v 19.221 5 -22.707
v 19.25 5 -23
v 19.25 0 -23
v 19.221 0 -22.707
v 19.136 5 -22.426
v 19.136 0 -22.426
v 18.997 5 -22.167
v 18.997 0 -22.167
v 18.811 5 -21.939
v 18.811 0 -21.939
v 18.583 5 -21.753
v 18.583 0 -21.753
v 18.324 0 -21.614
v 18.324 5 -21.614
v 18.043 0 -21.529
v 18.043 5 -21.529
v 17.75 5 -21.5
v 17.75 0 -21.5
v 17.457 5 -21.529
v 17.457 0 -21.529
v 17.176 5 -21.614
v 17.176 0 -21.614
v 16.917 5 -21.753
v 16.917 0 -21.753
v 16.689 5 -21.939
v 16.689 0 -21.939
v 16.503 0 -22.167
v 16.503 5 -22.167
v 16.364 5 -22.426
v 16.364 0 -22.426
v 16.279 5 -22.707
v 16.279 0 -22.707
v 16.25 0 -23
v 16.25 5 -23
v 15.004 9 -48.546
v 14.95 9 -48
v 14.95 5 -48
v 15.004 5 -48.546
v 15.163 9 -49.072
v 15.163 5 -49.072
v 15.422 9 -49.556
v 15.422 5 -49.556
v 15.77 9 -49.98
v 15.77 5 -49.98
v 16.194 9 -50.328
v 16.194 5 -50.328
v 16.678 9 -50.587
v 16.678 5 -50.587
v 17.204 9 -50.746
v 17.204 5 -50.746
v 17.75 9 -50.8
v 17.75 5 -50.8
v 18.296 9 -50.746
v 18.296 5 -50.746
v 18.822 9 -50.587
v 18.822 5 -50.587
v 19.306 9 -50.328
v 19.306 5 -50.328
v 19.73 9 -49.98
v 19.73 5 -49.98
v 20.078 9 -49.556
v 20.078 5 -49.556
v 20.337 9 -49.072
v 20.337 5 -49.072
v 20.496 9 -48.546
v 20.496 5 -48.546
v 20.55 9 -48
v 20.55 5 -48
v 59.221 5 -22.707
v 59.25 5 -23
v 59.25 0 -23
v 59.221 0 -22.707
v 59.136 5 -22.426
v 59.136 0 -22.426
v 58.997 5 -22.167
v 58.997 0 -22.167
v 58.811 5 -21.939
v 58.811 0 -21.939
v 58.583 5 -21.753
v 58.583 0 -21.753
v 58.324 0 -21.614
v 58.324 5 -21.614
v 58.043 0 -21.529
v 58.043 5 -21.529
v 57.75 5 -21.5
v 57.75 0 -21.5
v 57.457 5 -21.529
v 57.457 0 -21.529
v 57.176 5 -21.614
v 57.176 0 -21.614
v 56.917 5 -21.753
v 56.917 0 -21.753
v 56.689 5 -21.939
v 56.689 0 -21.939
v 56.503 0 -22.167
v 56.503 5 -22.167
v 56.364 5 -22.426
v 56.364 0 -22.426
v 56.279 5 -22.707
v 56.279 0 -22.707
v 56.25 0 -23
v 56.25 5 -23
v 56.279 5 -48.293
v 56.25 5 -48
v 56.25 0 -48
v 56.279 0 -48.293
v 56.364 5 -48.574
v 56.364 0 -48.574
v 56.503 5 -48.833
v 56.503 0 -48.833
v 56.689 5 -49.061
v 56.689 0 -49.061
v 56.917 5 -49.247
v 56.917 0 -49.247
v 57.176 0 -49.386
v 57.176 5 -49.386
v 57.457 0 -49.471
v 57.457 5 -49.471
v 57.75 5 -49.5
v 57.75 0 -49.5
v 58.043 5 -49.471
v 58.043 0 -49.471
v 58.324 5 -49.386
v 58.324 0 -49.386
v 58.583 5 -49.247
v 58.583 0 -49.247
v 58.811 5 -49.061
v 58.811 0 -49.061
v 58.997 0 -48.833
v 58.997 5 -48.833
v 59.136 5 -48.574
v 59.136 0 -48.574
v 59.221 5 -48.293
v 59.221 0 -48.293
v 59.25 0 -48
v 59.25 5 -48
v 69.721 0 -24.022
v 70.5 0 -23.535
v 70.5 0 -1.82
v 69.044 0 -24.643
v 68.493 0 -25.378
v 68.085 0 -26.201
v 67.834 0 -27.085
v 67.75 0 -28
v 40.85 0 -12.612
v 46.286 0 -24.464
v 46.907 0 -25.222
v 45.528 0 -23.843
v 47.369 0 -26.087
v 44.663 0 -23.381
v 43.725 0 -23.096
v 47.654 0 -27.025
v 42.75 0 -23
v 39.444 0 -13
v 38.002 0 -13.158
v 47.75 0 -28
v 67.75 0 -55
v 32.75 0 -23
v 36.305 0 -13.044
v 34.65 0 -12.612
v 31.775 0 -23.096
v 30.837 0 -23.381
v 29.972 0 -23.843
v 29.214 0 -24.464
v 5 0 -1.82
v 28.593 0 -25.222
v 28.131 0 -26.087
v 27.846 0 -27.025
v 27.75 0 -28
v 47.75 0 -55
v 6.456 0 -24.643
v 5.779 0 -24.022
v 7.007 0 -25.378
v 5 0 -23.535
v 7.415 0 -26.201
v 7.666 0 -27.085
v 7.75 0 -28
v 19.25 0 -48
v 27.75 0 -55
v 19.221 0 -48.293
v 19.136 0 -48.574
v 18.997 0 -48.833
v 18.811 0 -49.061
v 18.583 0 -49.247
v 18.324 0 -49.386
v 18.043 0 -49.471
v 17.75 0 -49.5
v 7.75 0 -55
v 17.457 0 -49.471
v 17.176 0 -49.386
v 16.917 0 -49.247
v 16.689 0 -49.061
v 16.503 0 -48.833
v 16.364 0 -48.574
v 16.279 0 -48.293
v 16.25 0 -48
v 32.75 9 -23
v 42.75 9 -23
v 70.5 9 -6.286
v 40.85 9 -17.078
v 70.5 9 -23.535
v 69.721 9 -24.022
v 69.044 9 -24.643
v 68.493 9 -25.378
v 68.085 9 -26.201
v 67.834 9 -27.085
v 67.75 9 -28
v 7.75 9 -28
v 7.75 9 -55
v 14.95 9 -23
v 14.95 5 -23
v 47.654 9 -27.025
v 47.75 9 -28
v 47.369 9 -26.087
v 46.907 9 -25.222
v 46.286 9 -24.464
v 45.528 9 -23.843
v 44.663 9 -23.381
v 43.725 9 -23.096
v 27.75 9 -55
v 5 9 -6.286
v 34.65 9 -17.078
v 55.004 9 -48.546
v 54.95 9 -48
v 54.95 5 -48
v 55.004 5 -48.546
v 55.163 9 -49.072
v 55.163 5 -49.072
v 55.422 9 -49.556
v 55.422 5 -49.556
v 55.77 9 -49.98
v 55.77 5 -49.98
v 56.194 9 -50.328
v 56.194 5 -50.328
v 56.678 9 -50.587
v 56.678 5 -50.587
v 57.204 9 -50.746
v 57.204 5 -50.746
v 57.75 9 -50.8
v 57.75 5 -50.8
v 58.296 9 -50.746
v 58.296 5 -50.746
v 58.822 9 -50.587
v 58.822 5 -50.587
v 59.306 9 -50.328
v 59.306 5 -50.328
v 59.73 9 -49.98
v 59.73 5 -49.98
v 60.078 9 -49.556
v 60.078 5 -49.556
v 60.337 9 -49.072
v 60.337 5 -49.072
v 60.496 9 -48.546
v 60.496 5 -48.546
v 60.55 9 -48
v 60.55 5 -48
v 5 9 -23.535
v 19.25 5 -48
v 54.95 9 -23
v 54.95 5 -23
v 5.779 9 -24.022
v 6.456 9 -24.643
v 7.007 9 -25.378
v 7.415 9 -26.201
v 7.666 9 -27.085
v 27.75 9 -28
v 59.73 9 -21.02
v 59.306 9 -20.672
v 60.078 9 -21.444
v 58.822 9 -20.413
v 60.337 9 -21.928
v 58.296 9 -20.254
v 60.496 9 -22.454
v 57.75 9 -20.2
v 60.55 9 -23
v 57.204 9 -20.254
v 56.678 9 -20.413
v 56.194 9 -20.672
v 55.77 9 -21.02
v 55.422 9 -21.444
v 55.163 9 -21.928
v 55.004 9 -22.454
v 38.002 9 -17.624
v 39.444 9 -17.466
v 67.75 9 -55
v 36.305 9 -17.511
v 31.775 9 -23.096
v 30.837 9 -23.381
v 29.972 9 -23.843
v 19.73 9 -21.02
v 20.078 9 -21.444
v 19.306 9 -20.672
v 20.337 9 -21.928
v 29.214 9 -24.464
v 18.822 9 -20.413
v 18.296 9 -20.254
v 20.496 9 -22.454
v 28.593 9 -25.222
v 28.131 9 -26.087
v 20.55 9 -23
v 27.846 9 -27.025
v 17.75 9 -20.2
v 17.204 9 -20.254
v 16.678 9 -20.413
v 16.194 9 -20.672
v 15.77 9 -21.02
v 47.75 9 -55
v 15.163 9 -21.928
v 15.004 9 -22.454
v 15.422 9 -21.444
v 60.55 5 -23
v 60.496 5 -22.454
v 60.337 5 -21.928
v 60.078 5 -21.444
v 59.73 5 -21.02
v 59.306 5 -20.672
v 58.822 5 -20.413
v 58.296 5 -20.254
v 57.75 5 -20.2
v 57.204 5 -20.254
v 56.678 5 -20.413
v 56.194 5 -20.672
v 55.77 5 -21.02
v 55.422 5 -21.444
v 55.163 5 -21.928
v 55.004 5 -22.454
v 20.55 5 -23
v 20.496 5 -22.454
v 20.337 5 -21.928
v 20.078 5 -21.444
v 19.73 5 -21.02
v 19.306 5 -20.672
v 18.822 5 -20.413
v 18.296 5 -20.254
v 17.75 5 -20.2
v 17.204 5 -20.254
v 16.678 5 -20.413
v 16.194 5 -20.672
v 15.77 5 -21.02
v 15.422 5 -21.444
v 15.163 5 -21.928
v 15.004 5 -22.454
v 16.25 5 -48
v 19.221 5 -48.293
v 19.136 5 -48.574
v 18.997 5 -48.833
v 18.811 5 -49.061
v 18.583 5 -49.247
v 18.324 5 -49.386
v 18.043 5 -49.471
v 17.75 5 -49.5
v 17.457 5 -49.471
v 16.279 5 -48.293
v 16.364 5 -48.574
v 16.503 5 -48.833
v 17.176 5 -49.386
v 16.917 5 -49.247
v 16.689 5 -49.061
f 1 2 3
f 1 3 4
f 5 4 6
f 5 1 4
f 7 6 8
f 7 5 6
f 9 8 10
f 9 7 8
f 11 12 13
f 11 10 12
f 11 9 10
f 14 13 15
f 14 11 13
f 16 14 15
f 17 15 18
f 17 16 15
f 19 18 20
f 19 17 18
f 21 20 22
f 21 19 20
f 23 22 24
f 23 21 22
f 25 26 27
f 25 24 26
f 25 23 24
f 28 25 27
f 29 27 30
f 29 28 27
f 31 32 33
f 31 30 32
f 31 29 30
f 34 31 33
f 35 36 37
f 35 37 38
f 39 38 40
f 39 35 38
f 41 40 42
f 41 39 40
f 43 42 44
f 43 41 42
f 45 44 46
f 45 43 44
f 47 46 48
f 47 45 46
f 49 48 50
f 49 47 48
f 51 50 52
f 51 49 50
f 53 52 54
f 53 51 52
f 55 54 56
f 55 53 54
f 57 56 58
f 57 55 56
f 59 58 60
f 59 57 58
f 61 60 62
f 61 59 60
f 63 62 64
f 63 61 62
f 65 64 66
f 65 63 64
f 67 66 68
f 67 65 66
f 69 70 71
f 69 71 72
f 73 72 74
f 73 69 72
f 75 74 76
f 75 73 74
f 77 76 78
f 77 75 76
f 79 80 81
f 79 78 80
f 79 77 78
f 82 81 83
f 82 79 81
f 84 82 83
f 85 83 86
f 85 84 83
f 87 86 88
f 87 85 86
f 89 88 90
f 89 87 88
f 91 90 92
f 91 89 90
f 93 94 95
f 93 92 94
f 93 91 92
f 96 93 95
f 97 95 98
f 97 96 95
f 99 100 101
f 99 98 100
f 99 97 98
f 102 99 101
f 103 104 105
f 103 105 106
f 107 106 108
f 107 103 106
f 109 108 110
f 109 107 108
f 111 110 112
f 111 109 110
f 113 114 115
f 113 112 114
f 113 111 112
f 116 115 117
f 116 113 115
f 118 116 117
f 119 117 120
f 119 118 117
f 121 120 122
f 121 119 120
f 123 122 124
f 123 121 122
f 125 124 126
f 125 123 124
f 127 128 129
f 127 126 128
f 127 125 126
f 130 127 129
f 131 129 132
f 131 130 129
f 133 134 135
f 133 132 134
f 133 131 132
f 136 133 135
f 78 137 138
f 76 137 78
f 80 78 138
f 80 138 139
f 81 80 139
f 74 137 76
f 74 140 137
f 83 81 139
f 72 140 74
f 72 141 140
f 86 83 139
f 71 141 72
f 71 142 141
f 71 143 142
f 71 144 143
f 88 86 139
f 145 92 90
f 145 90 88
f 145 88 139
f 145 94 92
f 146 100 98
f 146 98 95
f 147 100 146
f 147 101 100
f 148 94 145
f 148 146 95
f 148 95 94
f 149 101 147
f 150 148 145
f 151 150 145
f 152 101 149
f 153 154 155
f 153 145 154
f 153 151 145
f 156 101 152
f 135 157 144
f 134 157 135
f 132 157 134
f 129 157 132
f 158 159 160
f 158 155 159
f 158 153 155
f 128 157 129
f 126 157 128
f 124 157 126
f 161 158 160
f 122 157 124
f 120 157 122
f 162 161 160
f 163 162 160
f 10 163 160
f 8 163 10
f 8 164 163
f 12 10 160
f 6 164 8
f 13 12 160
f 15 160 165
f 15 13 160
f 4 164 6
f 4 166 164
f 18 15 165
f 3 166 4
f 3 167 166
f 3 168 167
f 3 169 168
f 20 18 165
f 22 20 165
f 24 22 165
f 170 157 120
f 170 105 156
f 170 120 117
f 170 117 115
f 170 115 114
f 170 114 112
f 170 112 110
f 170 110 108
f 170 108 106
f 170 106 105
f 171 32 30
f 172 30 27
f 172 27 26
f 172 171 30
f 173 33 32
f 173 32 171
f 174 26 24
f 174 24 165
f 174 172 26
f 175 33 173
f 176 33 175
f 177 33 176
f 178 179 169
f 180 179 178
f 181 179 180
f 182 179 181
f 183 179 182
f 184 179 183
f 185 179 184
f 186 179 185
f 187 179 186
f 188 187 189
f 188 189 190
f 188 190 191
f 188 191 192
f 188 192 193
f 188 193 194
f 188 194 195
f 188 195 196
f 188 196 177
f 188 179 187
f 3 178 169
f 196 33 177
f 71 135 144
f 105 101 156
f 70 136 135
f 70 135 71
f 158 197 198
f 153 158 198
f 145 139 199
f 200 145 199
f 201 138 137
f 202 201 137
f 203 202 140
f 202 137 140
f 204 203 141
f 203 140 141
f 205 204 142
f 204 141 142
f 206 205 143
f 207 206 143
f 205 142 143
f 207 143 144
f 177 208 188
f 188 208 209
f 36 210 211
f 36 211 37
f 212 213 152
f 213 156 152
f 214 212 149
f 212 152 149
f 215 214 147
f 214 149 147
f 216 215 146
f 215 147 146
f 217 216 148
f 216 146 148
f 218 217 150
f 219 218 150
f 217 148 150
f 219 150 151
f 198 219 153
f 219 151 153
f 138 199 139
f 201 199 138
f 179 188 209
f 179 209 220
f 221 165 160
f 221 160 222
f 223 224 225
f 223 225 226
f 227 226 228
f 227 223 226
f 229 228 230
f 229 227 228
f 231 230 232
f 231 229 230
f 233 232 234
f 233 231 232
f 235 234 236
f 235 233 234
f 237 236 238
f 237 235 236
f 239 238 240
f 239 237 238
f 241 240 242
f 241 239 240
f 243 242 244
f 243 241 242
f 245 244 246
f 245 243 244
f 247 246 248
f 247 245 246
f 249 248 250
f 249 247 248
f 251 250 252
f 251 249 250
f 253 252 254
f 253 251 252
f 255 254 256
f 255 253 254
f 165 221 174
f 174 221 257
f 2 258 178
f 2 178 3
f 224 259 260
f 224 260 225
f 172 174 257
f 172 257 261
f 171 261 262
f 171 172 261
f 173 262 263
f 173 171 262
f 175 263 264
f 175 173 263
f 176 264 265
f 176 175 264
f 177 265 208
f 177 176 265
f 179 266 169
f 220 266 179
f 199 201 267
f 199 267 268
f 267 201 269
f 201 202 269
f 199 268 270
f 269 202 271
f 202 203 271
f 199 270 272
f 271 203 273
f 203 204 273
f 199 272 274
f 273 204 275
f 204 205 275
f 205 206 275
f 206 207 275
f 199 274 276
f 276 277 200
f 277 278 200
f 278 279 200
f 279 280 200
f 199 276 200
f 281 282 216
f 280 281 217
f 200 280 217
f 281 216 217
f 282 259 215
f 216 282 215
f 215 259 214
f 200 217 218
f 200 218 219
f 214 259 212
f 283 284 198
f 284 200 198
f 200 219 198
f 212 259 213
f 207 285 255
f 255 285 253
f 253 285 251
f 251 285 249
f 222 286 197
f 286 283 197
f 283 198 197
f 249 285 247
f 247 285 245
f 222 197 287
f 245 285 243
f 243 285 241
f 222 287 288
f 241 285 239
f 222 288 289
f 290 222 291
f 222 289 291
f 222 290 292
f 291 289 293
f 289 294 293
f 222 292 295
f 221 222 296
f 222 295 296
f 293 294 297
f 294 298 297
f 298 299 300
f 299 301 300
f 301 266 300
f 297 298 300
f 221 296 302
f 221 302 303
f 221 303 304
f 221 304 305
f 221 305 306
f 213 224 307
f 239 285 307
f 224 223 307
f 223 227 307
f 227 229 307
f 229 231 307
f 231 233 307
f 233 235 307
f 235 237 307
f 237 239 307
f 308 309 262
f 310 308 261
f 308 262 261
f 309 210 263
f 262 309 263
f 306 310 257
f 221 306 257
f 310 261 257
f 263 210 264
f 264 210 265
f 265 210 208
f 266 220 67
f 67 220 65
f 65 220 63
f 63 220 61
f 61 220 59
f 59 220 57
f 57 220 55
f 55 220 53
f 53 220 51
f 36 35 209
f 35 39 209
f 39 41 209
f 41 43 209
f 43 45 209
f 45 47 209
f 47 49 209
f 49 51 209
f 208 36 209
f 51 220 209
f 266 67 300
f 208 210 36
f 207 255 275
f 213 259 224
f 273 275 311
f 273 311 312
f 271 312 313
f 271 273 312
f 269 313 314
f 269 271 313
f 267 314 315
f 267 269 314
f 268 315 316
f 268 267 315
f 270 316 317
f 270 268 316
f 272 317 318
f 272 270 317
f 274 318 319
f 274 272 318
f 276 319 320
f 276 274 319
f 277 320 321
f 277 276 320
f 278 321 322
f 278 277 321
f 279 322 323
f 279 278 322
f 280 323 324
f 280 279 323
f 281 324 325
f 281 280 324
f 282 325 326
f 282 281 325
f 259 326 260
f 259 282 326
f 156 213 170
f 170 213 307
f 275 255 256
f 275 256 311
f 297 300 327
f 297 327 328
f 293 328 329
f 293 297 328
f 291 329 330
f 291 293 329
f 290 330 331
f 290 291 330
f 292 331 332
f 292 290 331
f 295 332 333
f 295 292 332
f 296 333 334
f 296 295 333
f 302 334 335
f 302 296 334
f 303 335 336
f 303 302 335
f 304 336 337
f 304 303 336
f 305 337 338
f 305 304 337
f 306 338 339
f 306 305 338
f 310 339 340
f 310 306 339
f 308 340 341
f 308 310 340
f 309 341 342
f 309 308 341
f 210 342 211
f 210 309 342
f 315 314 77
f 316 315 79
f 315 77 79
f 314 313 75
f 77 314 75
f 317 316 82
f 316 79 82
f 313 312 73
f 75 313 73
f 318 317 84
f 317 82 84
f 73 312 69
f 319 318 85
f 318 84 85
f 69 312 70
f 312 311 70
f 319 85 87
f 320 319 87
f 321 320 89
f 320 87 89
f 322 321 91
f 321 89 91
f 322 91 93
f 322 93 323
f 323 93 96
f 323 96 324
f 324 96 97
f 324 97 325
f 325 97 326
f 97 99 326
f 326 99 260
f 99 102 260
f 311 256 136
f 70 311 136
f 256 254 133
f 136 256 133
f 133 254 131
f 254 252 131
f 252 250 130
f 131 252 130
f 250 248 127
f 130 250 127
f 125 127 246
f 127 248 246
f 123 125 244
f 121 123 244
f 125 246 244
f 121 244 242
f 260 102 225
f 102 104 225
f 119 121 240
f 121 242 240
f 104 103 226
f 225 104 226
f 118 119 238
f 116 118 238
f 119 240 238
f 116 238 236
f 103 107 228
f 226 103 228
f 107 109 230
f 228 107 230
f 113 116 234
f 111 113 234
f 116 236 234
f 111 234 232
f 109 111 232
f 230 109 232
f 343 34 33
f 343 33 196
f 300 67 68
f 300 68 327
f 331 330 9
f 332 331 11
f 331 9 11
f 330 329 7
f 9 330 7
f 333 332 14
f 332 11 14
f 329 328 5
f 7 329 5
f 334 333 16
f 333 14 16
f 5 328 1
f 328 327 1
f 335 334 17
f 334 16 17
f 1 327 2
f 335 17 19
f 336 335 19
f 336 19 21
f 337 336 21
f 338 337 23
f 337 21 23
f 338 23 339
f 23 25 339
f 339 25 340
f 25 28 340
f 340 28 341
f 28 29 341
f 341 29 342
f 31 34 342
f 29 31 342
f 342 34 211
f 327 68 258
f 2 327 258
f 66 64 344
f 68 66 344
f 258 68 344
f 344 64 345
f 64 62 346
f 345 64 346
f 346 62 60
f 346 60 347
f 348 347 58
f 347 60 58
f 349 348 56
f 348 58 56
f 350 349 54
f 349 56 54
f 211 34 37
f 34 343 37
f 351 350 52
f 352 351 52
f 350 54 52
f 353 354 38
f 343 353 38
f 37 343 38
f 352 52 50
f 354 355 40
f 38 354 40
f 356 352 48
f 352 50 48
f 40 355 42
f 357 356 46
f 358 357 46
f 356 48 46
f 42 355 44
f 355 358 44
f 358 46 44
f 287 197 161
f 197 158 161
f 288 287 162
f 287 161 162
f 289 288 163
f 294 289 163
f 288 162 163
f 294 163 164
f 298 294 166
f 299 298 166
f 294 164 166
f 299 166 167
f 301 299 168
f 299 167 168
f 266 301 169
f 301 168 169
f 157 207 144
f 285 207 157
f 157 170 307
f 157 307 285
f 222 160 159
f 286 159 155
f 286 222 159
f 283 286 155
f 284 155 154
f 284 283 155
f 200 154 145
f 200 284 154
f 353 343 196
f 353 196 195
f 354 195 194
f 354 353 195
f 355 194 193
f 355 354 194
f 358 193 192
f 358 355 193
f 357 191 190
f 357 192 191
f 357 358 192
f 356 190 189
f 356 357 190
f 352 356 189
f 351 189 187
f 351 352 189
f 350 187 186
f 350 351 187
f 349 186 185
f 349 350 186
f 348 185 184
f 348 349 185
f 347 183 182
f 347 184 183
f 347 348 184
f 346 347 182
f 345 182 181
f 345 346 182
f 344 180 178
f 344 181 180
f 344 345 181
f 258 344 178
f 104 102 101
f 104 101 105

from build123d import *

# Parameters (mm, degrees)
BOSS_EXTRUDE1_DEPTH = 9
CUT_EXTRUDE2_REACH  = 95.842
SKETCH5_W           = 20
SKETCH5_H           = 32
SKETCH5_W_2         = 7.75
CUT_EXTRUDE3_DEPTH  = 10
FILLET1_R           = 5
CUT_EXTRUDE4_DEPTH  = 4
CHAMFER1_SIZE       = 9
CHAMFER1_SIZE_2     = 4.196768923
FILLET2_R           = 10
CUT_EXTRUDE5_REACH  = 95.842
SKETCH7_W           = 5
SKETCH7_H           = 33.085129134
SKETCH7_H_2         = 33.745309592


with BuildPart() as part:
    # Sketch1 → Boss-Extrude1 (new body)
    with BuildSketch(Plane(origin=(0, 0, 0), x_dir=(1, 0, 0), z_dir=(0, 1, 0))):
        Polygon((0, 0), (0, 55), (75.5, 55), (75.5, 0), (37.75, 13.739876344), align=None)
    extrude(amount=BOSS_EXTRUDE1_DEPTH)

    # Sketch4 → Cut-Extrude2 (cut, up to next)
    with BuildSketch(Plane(origin=(0, 9, 0), x_dir=(1, 0, 0), z_dir=(0, 1, 0)), mode=Mode.PRIVATE) as cut_extrude2_sk1:
        with BuildLine():
            Line((19.25, 48), (19.25, 23))
            ThreePointArc((19.25, 23), (17.75, 21.5), (16.25, 23))
            Line((16.25, 23), (16.25, 48))
            ThreePointArc((16.25, 48), (17.75, 49.5), (19.25, 48))
        make_face()
    cut_extrude2_tool1 = extrude(cut_extrude2_sk1.sketch, amount=-CUT_EXTRUDE2_REACH, mode=Mode.PRIVATE) & part.part
    # Sketch4 → Cut-Extrude2 (cut, up to next)
    with BuildSketch(Plane(origin=(0, 9, 0), x_dir=(1, 0, 0), z_dir=(0, 1, 0)), mode=Mode.PRIVATE) as cut_extrude2_sk2:
        with BuildLine():
            Line((59.25, 48), (59.25, 23))
            ThreePointArc((59.25, 23), (57.75, 21.5), (56.25, 23))
            Line((56.25, 23), (56.25, 48))
            ThreePointArc((56.25, 48), (57.75, 49.5), (59.25, 48))
        make_face()
    cut_extrude2_tool2 = extrude(cut_extrude2_sk2.sketch, amount=-CUT_EXTRUDE2_REACH, mode=Mode.PRIVATE) & part.part
    add(cut_extrude2_tool1.solids().sort_by_distance((17.75, 9, -35.5))[0], mode=Mode.SUBTRACT)
    add(cut_extrude2_tool2.solids().sort_by_distance((57.75, 9, -35.5))[0], mode=Mode.SUBTRACT)

    # Sketch5 → Cut-Extrude3 (cut)
    with BuildSketch(Plane(origin=(0, 9, 0), x_dir=(1, 0, 0), z_dir=(0, 1, 0))):
        with Locations((37.75, 39)):
            Rectangle(SKETCH5_W, SKETCH5_H)
        with Locations((71.625, 39)):
            Rectangle(SKETCH5_W_2, SKETCH5_H)
        with Locations((3.875, 39)):
            Rectangle(SKETCH5_W_2, SKETCH5_H)
    extrude(amount=-CUT_EXTRUDE3_DEPTH, mode=Mode.SUBTRACT)

    # Fillet1
    fillet1_edges = [part.edges().sort_by_distance(p)[0] for p in [
        (27.75, 4.5, -23),
        (47.75, 4.5, -23),
        (7.75, 4.5, -23),
        (67.75, 4.5, -23),
    ]]
    fillet(fillet1_edges, radius=FILLET1_R)

    # Sketch6 → Cut-Extrude4 (cut)
    with BuildSketch(Plane(origin=(0, 9, 0), x_dir=(1, 0, 0), z_dir=(0, 1, 0))):
        with BuildLine():
            Line((20.55, 48), (20.55, 23))
            ThreePointArc((20.55, 23), (17.75, 20.2), (14.95, 23))
            Line((14.95, 23), (14.95, 48))
            ThreePointArc((14.95, 48), (17.75, 50.8), (20.55, 48))
        make_face()
        with BuildLine():
            Line((60.55, 48), (60.55, 23))
            ThreePointArc((60.55, 23), (57.75, 20.2), (54.95, 23))
            Line((54.95, 23), (54.95, 48))
            ThreePointArc((54.95, 48), (57.75, 50.8), (60.55, 48))
        make_face()
    extrude(amount=-CUT_EXTRUDE4_DEPTH, mode=Mode.SUBTRACT)

    # Chamfer1
    # the kernel refuses this chamfer: 9, 4.196768923 mm, written as the material it takes off along each edge
    with BuildSketch(Plane(origin=(97.41248478, 9, 7.975492219), x_dir=(-0.005578746693930982, -0.9998669641130703, 0.015327480570432298), z_dir=(-0.939692620785907, 0, -0.3420201433256727))) as chamfer1_piece_1_section:
        Polygon((CHAMFER1_SIZE * 0.999866964113, -CHAMFER1_SIZE * 0.0163111641311), (-CHAMFER1_SIZE_2 * 0.0163111641326, -CHAMFER1_SIZE_2 * 0.999866964207), (0, 0), align=None)
    chamfer1_piece_1 = extrude(amount=86.810269397, mode=Mode.PRIVATE)
    chamfer1_piece_1 = split(chamfer1_piece_1, bisect_by=Plane(origin=(61.945555659, 5.929396418, -22.546338405), z_dir=(0.3420201433256727, 0, 0.939692620785907)), keep=Keep.TOP, mode=Mode.PRIVATE)
    add(chamfer1_piece_1, mode=Mode.SUBTRACT)
    with BuildSketch(Plane(origin=(59.66248478, 9, -21.715368562), x_dir=(0.0055787466939309265, -0.9998669641130703, 0.015327480570432147), z_dir=(-0.939692620785907, 0, 0.3420201433256727))) as chamfer1_piece_2_section:
        Polygon((CHAMFER1_SIZE * 0.999866964113, -CHAMFER1_SIZE * 0.0163111641311), (-CHAMFER1_SIZE_2 * 0.0163111641326, -CHAMFER1_SIZE_2 * 0.999866964207), (0, 0), align=None)
    chamfer1_piece_2 = extrude(amount=86.810269397, mode=Mode.PRIVATE)
    chamfer1_piece_2 = split(chamfer1_piece_2, bisect_by=Plane(origin=(13.554444341, 5.929396418, -22.546338405), z_dir=(-0.3420201433256727, 0, 0.939692620785907)), keep=Keep.TOP, mode=Mode.PRIVATE)
    add(chamfer1_piece_2, mode=Mode.SUBTRACT)
    with BuildSketch(Plane(origin=(97.41248478, 9, 7.975492219), x_dir=(-0.005578746693930982, -0.9998669641130703, 0.015327480570432298), z_dir=(-0.939692620785907, 0, -0.3420201433256727))) as chamfer1_piece_3a_section:
        Polygon((CHAMFER1_SIZE * 0.999866964113, -CHAMFER1_SIZE * 0.0163111641311), (-CHAMFER1_SIZE_2 * 0.0163111641326, -CHAMFER1_SIZE_2 * 0.999866964207), (0, 0), align=None)
    chamfer1_piece_3a = extrude(amount=86.810269397, mode=Mode.PRIVATE)
    chamfer1_piece_3a = split(chamfer1_piece_3a, bisect_by=Plane(origin=(30.782637317, 6.02174195, -11.203963716), z_dir=(-0.3420201433256727, 0, -0.939692620785907)), keep=Keep.TOP, mode=Mode.PRIVATE)
    with BuildSketch(Plane(origin=(59.66248478, 9, -21.715368562), x_dir=(0.0055787466939309265, -0.9998669641130703, 0.015327480570432147), z_dir=(-0.939692620785907, 0, 0.3420201433256727))) as chamfer1_piece_3b_section:
        Polygon((CHAMFER1_SIZE * 0.999866964113, -CHAMFER1_SIZE * 0.0163111641311), (-CHAMFER1_SIZE_2 * 0.0163111641326, -CHAMFER1_SIZE_2 * 0.999866964207), (0, 0), align=None)
    chamfer1_piece_3b = extrude(amount=86.810269397, mode=Mode.PRIVATE)
    chamfer1_piece_3b = split(chamfer1_piece_3b, bisect_by=Plane(origin=(44.717362683, 6.02174195, -11.203963716), z_dir=(0.3420201433256727, 0, -0.939692620785907)), keep=Keep.TOP, mode=Mode.PRIVATE)
    chamfer1_piece_3 = chamfer1_piece_3a & chamfer1_piece_3b
    add(chamfer1_piece_3, mode=Mode.SUBTRACT)

    # Fillet2
    fillet2_edges = [part.edges().sort_by_distance(p)[0] for p in [
        (37.75, 4.5, -15.972930446),
    ]]
    fillet(fillet2_edges, radius=FILLET2_R)

    # Sketch7 → Cut-Extrude5 (cut, up to next)
    with BuildSketch(Plane(origin=(0, 9, 0), x_dir=(1, 0, 0), z_dir=(0, 1, 0)), mode=Mode.PRIVATE) as cut_extrude5_sk1:
        with Locations((2.5, 16.542564567)):
            Rectangle(SKETCH7_W, SKETCH7_H)
    cut_extrude5_tool1 = extrude(cut_extrude5_sk1.sketch, amount=-CUT_EXTRUDE5_REACH, mode=Mode.PRIVATE) & part.part
    # Sketch7 → Cut-Extrude5 (cut, up to next)
    with BuildSketch(Plane(origin=(0, 9, 0), x_dir=(1, 0, 0), z_dir=(0, 1, 0)), mode=Mode.PRIVATE) as cut_extrude5_sk2:
        with Locations((73, 16.872654796)):
            Rectangle(SKETCH7_W, SKETCH7_H_2)
    cut_extrude5_tool2 = extrude(cut_extrude5_sk2.sketch, amount=-CUT_EXTRUDE5_REACH, mode=Mode.PRIVATE) & part.part
    add(cut_extrude5_tool1.solids().sort_by_distance((2.5, 9, -16.542565))[0], mode=Mode.SUBTRACT)
    add(cut_extrude5_tool2.solids().sort_by_distance((73, 9, -16.872655))[0], mode=Mode.SUBTRACT)


solid = part.part
